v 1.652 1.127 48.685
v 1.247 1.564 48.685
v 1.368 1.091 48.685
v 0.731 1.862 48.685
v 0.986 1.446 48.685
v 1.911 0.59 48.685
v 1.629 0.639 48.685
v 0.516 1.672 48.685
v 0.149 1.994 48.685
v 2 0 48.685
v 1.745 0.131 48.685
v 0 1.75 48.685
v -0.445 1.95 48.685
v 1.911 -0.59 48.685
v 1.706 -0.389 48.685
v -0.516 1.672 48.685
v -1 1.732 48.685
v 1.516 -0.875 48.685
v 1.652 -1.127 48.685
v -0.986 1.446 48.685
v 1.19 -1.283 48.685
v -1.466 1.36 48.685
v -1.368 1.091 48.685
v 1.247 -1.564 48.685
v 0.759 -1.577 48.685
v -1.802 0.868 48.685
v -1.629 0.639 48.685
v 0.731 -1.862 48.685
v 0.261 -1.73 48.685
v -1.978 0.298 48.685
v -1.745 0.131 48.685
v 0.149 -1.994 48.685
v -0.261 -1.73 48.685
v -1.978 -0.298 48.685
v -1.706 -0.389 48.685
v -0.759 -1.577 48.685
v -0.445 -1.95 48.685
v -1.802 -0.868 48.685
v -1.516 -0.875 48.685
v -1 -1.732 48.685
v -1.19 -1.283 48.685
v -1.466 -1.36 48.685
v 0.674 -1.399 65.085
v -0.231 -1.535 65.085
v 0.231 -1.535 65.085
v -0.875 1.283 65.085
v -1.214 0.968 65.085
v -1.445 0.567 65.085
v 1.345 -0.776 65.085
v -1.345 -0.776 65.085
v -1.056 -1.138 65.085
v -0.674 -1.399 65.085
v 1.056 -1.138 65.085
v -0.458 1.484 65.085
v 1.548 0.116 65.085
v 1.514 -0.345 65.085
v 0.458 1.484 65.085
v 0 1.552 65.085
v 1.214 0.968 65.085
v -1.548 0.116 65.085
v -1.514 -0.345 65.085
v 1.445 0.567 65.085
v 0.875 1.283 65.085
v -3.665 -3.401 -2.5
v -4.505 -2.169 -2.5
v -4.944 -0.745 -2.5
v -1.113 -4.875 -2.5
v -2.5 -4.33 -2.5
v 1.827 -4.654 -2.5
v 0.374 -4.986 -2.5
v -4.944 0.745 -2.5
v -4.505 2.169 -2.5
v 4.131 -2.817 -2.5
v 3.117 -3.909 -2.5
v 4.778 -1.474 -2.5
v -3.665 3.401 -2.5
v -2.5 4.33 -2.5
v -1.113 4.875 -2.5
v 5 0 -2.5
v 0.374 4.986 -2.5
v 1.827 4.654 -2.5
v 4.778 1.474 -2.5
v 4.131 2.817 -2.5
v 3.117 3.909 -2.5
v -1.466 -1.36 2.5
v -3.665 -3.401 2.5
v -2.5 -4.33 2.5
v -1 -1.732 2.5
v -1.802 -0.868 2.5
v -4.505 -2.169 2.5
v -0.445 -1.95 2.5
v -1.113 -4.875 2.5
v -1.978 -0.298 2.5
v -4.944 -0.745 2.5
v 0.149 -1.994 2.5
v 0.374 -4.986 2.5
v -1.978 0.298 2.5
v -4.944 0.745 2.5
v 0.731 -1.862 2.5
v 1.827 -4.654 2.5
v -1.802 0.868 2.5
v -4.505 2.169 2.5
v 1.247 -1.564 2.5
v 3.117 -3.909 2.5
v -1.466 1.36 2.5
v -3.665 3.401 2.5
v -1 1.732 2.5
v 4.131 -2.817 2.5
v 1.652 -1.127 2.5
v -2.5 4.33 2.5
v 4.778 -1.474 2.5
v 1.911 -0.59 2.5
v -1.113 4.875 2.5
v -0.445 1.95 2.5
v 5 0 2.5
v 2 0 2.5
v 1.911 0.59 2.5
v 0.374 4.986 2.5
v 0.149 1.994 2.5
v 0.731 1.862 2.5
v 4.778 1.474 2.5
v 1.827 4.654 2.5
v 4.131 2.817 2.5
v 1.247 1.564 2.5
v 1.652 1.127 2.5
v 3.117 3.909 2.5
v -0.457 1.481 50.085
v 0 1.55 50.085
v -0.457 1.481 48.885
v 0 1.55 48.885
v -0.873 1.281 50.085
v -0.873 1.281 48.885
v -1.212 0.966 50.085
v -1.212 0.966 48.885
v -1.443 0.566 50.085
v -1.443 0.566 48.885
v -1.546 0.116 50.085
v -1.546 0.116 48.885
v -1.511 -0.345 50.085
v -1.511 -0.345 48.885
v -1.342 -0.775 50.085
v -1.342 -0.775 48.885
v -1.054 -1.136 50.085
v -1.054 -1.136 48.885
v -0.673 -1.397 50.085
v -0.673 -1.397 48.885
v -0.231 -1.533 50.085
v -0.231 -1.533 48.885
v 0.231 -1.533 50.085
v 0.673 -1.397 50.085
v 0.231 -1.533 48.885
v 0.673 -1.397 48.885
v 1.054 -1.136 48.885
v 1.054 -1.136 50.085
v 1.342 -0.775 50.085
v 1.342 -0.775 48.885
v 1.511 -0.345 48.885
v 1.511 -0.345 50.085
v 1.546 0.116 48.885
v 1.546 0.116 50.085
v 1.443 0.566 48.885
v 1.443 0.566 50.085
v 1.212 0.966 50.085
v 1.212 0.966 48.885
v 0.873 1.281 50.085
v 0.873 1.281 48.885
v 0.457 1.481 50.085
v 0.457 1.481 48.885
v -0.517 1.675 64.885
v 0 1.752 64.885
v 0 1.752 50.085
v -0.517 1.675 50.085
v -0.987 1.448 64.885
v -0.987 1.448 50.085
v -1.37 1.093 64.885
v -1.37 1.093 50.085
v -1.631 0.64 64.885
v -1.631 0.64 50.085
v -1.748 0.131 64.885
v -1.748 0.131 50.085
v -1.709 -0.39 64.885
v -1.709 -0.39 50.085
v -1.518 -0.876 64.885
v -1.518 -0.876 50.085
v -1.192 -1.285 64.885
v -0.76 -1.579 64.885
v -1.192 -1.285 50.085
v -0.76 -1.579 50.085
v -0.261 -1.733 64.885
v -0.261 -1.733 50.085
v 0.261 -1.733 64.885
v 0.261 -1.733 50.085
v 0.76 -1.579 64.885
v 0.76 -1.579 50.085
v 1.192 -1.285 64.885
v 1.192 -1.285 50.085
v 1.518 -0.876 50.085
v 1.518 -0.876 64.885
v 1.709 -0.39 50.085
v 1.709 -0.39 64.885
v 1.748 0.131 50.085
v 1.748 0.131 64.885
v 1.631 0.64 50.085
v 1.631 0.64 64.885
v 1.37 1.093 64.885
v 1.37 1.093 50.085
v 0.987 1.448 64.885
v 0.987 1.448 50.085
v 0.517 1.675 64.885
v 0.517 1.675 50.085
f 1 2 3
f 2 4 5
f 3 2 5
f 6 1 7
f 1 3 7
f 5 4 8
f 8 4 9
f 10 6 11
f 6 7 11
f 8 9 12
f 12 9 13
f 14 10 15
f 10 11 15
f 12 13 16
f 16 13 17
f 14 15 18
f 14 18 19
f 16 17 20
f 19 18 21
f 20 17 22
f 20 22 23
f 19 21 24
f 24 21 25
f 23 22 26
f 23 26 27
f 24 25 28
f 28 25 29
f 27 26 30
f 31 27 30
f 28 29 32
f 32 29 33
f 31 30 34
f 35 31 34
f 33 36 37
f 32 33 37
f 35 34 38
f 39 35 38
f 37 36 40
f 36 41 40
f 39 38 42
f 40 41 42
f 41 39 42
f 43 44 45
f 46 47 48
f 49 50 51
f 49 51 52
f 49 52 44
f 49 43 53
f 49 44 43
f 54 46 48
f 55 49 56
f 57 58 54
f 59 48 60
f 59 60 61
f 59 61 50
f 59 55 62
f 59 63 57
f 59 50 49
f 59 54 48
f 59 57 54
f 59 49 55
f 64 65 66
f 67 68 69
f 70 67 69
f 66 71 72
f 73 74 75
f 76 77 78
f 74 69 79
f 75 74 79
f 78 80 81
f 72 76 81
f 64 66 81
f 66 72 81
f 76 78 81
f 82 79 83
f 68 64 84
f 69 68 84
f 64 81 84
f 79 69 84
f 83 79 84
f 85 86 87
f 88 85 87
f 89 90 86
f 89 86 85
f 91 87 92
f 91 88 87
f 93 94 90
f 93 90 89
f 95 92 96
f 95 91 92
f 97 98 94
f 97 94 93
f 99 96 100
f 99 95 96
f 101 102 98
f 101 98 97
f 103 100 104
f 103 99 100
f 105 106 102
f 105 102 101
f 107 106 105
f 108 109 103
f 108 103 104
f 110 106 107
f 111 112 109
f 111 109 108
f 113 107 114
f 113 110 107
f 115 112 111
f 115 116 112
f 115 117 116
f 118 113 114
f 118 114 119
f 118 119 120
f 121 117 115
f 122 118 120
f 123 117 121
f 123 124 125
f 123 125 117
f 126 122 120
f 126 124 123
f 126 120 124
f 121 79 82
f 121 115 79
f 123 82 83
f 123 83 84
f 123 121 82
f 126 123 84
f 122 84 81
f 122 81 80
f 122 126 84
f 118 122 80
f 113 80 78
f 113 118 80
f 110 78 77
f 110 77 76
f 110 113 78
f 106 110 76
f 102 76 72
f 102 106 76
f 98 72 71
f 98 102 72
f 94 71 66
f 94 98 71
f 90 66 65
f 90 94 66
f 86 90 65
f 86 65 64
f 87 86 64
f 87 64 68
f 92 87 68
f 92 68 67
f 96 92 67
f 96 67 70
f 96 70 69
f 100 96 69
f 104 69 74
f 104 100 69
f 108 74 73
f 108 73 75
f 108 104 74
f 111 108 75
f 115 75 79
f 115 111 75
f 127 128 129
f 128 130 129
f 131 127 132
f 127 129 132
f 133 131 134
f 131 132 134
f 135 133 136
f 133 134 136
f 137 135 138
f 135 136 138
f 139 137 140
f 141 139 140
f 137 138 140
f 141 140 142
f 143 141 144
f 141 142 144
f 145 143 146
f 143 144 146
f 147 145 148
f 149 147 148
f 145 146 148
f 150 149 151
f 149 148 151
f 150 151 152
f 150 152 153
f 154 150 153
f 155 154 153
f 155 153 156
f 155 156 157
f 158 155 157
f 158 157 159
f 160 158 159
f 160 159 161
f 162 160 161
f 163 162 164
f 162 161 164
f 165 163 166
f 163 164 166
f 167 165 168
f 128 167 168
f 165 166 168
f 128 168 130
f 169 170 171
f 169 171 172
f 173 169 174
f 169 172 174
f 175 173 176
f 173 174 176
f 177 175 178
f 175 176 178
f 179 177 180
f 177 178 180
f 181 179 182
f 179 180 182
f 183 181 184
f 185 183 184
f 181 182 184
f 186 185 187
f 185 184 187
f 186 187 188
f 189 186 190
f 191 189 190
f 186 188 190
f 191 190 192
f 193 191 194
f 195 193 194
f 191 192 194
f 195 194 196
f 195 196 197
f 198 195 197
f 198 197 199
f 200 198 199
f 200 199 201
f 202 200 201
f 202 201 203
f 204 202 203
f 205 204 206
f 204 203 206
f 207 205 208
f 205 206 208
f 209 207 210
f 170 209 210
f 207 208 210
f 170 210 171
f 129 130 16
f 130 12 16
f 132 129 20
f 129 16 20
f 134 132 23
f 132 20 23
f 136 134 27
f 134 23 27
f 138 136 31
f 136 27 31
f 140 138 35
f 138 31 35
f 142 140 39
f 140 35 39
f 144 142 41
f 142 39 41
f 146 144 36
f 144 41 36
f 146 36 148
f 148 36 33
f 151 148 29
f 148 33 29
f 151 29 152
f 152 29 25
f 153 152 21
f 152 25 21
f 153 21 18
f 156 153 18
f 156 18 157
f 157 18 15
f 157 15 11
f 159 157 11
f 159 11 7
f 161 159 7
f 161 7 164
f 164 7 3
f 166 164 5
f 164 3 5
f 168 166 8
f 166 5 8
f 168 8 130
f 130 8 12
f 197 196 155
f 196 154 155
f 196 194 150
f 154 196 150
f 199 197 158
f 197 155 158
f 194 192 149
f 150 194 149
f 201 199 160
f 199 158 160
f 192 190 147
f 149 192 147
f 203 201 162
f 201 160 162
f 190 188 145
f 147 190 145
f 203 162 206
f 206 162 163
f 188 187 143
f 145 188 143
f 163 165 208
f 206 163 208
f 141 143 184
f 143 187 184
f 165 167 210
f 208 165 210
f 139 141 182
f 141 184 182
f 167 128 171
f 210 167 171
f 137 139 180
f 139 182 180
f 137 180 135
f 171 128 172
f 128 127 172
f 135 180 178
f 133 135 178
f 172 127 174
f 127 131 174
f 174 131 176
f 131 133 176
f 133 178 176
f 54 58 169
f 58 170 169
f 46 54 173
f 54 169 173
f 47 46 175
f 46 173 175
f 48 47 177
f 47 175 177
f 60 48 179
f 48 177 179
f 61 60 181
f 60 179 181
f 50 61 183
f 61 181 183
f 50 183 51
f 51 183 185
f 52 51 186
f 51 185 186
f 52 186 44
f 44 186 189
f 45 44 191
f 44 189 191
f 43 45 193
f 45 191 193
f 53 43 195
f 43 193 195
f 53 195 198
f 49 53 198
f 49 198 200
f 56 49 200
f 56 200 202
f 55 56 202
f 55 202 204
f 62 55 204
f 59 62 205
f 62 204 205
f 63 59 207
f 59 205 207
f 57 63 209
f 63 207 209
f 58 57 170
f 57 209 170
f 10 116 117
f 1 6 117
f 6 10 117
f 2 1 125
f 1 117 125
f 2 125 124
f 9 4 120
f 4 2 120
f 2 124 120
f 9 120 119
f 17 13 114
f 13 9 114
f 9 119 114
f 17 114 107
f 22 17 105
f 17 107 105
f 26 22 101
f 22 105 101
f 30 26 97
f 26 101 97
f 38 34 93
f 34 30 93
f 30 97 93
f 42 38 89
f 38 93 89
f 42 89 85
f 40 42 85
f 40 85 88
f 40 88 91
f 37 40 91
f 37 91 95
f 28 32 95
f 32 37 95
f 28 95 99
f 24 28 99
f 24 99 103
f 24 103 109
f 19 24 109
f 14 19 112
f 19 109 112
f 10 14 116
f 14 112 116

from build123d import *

# Parameters (mm, degrees)
SKETCH1_R          = 2
BASE_EXTRUDE_DEPTH = 65.085
SKETCH2_R          = 5
PISTON_DEPTH       = 2.5


with BuildPart() as part:
    # Sketch1 → Base-Extrude (new body)
    with BuildSketch(Plane.XY):
        Circle(SKETCH1_R)
    extrude(amount=BASE_EXTRUDE_DEPTH)

    # Sketch2 → Piston (add, symmetric)
    with BuildSketch(Plane.XY):
        Circle(SKETCH2_R)
    extrude(amount=PISTON_DEPTH, both=True)

    # Sketch3 → Threads (revolve, cut)
    with BuildSketch(Plane(origin=(0, 0, 0), x_dir=(0, 0, -1), z_dir=(1, 0, 0))):
        Polygon((-65.085, 1.5525), (-64.885, 1.7525), (-50.085, 1.7525), (-50.085, 1.55), (-48.885, 1.55), (-48.685, 1.75), (-48.685, 5), (-65.085, 5), align=None)
    revolve(axis=Axis((0, 0, 0), (0, 0, 1)), mode=Mode.SUBTRACT)


solid = part.part
